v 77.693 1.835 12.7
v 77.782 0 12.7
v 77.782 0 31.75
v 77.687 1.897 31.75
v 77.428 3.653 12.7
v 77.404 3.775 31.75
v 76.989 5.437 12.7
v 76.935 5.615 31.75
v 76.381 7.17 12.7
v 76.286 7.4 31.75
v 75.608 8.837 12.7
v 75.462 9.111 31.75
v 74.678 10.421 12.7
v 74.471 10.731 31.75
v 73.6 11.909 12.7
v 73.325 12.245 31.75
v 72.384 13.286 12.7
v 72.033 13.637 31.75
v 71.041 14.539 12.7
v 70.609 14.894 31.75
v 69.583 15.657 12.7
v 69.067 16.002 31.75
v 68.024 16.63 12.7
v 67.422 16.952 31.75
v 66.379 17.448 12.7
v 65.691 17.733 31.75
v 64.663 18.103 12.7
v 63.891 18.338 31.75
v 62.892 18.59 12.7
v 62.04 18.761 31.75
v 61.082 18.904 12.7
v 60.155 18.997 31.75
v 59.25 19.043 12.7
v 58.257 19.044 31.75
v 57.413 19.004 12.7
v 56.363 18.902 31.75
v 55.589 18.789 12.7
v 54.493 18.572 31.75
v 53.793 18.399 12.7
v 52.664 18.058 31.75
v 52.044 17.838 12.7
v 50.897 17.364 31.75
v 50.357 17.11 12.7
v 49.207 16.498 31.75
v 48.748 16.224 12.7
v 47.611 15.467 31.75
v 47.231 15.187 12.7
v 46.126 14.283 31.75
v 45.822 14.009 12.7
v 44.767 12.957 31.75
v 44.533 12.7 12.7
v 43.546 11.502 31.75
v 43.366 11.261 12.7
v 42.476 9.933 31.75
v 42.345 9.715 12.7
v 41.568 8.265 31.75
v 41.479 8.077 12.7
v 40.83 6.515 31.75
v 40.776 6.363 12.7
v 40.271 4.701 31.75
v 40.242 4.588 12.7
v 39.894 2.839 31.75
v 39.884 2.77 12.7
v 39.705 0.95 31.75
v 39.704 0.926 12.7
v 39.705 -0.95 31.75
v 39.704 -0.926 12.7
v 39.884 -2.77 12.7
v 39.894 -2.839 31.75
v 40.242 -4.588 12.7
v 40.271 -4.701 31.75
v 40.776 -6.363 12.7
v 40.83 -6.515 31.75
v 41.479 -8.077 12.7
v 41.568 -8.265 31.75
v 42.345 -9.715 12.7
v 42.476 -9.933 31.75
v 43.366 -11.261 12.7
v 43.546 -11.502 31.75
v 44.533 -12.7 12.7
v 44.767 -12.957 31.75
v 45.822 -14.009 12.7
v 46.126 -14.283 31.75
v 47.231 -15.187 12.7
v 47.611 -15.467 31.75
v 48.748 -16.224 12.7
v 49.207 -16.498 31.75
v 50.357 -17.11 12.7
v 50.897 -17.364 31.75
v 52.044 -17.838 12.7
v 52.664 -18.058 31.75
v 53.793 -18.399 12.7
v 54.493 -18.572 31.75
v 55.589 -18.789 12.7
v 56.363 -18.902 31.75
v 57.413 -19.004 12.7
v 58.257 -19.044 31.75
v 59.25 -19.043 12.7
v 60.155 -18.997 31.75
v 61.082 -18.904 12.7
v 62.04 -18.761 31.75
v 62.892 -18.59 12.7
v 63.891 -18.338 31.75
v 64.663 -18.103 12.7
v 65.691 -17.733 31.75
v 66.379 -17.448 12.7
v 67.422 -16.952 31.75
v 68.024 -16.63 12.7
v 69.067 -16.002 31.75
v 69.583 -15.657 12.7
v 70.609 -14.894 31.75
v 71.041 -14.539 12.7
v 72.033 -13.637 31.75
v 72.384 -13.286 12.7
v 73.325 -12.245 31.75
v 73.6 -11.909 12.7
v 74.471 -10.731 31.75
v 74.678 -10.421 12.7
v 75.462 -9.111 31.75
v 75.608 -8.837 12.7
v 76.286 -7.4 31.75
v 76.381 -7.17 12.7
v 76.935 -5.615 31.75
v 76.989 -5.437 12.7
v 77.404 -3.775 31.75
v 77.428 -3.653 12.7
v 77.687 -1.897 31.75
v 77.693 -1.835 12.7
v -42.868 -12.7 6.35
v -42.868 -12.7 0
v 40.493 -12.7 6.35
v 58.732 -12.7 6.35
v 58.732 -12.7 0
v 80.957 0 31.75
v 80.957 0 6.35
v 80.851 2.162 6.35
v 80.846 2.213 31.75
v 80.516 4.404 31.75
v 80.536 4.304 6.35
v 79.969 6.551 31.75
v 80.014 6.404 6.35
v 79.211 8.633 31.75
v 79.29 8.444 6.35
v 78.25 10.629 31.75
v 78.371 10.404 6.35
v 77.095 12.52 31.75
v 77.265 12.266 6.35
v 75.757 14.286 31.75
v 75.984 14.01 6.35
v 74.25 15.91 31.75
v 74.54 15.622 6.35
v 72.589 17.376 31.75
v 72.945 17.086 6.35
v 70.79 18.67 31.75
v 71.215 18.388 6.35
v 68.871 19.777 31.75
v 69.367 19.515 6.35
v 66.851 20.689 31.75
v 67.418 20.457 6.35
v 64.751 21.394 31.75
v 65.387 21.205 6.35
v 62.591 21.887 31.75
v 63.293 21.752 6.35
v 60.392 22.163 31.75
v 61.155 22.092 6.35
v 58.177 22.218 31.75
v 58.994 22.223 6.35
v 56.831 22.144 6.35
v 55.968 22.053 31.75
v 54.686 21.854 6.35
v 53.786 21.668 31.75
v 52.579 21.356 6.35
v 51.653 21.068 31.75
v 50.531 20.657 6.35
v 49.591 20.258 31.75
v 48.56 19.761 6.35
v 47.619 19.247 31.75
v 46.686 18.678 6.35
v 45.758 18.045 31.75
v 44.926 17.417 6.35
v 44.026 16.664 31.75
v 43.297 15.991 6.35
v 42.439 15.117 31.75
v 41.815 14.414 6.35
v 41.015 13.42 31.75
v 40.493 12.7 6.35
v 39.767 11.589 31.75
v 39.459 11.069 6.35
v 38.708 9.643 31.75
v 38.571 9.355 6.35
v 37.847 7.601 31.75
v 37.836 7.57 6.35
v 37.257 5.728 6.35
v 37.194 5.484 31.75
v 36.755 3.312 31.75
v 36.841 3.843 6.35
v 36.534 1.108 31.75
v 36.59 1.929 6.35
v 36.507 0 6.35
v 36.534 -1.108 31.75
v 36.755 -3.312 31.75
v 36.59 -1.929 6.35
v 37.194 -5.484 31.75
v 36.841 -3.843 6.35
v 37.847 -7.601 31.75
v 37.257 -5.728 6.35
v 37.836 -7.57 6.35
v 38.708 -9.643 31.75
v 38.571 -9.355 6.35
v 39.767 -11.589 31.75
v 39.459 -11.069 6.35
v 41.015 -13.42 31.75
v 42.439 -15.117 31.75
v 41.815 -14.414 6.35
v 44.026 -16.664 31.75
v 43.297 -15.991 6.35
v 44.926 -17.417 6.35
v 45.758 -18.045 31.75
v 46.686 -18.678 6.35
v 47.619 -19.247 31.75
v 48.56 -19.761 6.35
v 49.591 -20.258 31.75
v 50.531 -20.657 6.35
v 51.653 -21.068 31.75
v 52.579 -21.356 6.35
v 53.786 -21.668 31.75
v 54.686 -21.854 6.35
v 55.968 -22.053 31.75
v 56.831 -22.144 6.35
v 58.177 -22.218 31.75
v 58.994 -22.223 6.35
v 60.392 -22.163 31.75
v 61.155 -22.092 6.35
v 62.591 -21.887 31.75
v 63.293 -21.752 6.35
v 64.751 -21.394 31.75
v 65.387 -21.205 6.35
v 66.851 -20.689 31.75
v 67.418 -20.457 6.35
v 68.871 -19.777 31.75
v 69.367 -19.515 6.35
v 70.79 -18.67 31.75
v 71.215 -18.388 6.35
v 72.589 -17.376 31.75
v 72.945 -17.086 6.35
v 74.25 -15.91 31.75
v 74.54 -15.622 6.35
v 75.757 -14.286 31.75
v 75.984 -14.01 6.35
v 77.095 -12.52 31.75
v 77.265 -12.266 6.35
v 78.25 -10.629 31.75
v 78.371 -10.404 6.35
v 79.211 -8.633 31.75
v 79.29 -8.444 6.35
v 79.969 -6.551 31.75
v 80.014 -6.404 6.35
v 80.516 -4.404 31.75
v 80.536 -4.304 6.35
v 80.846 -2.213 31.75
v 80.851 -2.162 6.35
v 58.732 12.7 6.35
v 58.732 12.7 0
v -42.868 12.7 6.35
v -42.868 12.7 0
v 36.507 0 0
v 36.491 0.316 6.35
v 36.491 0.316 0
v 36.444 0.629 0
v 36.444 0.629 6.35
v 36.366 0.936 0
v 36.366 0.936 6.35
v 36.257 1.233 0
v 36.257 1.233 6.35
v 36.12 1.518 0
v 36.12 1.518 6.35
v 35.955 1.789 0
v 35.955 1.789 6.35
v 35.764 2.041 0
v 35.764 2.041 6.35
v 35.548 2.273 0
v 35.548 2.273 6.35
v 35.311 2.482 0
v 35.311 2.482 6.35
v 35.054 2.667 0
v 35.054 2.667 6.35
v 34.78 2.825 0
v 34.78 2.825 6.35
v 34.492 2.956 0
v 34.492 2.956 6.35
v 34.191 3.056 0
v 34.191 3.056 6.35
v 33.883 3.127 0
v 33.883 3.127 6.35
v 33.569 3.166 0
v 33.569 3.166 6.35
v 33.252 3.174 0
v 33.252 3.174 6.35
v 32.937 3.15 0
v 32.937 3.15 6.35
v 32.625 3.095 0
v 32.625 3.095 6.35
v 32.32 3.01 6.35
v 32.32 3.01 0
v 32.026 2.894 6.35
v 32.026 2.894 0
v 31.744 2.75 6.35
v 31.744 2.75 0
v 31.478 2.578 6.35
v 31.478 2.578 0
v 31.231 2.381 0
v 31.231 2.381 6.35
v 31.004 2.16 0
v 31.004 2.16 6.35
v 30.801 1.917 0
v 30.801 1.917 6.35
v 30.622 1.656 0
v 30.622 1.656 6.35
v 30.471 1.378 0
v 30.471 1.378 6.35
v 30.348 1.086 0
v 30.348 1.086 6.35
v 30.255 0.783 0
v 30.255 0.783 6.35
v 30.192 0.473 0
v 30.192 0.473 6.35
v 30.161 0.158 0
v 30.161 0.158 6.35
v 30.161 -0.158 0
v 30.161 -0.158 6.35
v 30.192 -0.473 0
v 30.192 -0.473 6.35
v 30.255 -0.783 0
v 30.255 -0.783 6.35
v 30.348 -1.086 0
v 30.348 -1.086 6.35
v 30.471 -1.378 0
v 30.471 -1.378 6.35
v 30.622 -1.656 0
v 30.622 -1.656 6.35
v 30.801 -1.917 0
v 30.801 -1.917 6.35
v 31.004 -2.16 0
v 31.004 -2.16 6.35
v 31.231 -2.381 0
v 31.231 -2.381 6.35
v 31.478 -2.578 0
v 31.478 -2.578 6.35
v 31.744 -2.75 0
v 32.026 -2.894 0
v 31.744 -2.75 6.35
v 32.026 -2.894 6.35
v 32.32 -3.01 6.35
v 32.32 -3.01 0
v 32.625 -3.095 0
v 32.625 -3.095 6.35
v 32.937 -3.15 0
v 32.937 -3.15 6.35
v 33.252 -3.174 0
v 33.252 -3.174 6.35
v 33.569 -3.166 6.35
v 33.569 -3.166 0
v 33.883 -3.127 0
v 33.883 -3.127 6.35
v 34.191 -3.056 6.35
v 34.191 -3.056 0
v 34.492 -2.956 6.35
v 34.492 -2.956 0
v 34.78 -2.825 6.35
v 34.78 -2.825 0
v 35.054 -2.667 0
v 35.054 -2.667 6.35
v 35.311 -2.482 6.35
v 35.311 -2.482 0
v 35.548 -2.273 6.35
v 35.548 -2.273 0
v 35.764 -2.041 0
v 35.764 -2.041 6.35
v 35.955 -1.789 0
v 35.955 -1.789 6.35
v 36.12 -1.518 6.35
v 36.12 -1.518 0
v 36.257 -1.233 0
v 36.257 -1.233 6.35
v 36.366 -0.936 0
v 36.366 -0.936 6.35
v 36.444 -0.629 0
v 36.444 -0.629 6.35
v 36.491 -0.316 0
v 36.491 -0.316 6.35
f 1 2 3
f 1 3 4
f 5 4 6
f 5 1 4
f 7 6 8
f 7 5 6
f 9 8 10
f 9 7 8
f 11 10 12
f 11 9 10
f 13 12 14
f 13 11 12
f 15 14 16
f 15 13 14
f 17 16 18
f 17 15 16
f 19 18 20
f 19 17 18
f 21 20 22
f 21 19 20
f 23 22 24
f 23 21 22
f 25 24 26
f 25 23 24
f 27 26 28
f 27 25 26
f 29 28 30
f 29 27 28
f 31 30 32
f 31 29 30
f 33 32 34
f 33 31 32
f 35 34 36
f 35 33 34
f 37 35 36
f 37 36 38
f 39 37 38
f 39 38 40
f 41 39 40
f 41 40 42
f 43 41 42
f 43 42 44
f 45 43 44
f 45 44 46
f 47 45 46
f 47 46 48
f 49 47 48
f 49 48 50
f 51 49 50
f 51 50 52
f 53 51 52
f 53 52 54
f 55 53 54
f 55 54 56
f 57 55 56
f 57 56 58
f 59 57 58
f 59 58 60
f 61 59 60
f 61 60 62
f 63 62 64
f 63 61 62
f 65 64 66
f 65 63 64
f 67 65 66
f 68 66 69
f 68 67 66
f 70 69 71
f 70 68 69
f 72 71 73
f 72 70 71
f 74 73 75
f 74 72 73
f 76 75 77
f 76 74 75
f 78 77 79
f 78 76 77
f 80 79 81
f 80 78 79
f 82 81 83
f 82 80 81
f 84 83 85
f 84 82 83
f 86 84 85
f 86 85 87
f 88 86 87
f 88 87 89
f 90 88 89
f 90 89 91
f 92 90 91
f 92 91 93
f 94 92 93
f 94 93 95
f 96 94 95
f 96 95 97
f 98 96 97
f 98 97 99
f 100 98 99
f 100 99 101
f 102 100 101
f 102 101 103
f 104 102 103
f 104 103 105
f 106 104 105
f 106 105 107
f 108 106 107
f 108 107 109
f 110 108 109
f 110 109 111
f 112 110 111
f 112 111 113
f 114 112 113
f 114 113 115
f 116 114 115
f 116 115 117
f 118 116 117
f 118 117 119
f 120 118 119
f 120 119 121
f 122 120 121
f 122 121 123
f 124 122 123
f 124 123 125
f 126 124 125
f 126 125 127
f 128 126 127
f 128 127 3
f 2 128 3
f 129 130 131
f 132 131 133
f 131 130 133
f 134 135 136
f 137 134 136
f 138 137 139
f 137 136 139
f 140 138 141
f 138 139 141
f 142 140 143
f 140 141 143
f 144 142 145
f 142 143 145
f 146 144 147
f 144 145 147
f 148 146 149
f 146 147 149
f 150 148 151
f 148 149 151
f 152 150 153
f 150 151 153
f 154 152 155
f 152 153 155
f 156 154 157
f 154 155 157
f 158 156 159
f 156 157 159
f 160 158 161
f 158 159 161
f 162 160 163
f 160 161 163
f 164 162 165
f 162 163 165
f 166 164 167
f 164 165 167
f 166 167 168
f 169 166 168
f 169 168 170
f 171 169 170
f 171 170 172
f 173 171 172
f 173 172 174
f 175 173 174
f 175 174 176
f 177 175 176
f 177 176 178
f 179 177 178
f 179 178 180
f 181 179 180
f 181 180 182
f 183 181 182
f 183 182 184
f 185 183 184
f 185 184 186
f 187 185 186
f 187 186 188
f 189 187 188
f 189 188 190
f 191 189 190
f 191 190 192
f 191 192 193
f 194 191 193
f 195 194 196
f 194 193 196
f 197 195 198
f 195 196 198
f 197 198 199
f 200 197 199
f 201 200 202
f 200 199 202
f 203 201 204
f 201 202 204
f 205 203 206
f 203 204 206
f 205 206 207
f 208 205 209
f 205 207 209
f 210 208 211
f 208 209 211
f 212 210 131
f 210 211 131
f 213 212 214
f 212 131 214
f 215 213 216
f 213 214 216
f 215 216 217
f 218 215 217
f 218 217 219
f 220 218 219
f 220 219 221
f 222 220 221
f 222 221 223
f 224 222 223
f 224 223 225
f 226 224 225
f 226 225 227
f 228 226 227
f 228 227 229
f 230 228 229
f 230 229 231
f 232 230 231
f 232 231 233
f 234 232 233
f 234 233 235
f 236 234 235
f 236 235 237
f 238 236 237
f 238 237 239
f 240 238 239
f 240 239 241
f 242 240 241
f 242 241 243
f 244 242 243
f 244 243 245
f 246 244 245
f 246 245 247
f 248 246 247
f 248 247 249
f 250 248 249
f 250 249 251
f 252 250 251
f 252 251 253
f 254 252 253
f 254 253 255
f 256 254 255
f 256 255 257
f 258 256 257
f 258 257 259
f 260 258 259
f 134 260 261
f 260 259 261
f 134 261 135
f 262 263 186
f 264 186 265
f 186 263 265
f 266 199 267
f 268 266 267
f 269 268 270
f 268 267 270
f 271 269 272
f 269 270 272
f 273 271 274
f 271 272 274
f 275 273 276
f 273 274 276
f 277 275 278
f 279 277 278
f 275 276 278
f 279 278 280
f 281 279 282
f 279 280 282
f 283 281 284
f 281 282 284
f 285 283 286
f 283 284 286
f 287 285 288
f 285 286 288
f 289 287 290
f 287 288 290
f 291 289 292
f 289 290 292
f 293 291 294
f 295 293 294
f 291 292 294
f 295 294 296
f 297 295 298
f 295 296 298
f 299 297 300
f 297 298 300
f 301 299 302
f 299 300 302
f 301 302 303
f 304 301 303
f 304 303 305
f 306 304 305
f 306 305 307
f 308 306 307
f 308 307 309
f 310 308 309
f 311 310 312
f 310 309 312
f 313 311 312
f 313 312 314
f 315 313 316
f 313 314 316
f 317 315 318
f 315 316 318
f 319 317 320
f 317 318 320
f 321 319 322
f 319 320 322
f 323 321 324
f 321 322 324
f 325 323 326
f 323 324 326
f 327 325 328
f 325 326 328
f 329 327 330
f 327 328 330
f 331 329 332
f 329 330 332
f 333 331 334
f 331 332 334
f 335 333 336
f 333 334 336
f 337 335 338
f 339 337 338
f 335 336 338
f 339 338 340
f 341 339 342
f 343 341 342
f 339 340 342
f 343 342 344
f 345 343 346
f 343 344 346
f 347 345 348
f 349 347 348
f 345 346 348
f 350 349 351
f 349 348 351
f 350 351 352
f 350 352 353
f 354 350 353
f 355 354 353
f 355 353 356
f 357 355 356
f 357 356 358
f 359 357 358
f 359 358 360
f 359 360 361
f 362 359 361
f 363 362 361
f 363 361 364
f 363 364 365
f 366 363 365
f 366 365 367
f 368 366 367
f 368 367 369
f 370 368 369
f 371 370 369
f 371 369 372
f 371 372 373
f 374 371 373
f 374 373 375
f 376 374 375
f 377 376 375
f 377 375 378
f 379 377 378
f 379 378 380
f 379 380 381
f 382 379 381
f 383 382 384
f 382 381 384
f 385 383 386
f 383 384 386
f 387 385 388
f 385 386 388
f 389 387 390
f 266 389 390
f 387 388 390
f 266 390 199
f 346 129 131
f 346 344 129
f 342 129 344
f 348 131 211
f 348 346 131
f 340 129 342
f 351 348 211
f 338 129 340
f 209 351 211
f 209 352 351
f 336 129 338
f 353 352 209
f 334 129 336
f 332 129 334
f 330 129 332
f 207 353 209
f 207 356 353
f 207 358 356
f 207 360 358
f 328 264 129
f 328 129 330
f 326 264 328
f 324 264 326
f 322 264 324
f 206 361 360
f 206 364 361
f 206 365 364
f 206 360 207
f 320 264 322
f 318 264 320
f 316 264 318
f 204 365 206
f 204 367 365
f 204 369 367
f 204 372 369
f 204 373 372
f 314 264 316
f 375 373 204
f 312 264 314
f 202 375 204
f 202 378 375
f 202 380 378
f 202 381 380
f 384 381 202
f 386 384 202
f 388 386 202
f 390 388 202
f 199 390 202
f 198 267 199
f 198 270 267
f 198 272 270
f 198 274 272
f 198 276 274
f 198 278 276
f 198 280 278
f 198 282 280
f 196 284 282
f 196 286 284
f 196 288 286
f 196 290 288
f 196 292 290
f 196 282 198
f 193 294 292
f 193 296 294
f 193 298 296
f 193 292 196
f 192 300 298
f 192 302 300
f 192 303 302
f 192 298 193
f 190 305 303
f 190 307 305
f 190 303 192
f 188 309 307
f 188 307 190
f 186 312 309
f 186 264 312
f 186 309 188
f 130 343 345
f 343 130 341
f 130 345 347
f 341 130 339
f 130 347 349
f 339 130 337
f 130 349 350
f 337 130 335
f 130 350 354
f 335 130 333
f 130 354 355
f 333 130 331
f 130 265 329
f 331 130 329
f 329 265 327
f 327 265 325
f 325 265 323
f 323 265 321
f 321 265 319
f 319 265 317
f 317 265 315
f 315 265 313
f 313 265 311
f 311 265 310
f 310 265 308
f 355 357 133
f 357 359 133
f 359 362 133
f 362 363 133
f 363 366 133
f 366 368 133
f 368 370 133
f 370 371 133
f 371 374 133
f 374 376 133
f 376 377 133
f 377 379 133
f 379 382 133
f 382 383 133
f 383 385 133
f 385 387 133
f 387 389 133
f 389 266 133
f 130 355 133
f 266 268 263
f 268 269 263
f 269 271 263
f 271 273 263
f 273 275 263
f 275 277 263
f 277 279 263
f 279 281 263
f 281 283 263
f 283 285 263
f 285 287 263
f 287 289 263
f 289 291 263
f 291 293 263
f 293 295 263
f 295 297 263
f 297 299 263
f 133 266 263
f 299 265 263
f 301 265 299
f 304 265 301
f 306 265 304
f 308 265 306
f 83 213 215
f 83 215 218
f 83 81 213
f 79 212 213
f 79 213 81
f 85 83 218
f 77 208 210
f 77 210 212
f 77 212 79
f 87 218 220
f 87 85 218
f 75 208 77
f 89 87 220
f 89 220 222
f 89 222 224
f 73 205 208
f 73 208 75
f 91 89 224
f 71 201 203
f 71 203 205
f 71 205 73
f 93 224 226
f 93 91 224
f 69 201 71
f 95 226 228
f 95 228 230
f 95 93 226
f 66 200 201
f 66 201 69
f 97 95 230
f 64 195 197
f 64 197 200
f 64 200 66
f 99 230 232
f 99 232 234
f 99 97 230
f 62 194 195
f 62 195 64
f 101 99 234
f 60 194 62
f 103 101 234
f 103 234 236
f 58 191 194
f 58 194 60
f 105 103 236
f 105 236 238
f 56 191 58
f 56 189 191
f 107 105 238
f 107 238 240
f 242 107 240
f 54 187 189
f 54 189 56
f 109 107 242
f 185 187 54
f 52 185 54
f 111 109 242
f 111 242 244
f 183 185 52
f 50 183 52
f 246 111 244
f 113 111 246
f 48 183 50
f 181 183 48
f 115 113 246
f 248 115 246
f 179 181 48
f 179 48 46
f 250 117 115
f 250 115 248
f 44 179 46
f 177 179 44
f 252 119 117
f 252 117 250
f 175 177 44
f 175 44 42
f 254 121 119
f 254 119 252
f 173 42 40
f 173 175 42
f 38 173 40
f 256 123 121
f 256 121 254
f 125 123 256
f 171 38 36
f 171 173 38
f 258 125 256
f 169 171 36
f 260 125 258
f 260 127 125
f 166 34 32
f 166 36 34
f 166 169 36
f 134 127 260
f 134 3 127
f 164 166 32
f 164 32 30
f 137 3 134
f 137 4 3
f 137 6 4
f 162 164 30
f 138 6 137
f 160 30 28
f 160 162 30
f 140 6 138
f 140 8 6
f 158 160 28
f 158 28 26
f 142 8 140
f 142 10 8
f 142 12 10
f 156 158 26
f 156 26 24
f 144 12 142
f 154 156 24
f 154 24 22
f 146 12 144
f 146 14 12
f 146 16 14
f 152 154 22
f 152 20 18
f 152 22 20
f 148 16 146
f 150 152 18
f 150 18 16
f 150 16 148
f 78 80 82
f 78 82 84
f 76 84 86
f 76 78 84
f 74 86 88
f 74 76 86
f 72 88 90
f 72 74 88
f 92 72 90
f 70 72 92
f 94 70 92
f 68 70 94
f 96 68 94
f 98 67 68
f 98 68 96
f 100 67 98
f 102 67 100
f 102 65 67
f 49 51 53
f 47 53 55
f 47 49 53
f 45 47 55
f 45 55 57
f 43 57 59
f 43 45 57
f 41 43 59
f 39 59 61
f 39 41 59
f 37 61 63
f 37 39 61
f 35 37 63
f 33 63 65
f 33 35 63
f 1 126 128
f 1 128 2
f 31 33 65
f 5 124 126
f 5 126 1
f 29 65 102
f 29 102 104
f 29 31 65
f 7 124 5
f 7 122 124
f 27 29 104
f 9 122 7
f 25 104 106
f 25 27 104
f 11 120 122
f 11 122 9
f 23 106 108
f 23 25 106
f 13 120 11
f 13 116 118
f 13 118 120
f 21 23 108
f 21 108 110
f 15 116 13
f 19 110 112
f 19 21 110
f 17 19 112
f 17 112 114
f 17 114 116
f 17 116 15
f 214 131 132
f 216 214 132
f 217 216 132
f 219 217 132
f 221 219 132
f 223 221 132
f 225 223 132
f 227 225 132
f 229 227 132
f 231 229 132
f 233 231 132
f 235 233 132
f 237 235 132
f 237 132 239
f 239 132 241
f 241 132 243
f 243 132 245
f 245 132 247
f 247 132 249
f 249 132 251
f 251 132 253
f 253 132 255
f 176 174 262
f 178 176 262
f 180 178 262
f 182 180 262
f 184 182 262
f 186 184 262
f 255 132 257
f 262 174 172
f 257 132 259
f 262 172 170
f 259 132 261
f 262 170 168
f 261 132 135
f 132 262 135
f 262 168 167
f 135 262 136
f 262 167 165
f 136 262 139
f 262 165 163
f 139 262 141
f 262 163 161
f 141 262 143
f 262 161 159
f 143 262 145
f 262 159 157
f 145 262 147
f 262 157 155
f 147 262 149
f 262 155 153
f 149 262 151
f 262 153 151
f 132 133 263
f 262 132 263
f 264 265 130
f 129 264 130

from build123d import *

# Parameters (mm, degrees)
F1_DEPTH = 6.35
F2_R     = 3.175
F3_DEPTH = 6.35
F5_DEPTH = 6.35
F4_R     = 22.225
F4_R_2   = 19.05
F6_DEPTH = 25.4


with BuildPart() as f1:
    # F0 (on Top) → F1 (new body)
    with BuildSketch(Plane.XY):
        Polygon((-42.868439, 12.7), (-42.868439, 0), (-42.868439, -12.7), (58.731561, -12.7), (58.731561, 12.7), align=None)
    extrude(amount=F1_DEPTH)

    # F2 (on face) → F3 (cut)
    with BuildSketch(Plane.XY.offset(6.35)):
        with Locations((33.331561, 0)):
            Circle(F2_R)
    extrude(amount=-F3_DEPTH, mode=Mode.SUBTRACT)

    # F4 (on face) → F5 (join)
    with BuildSketch(Plane.XY.offset(6.35)):
        with BuildLine():
            ThreePointArc((77.781561, 0), (65.529022, 17.795983), (44.532529, 12.7))
            Line((44.532529, 12.7), (58.731561, 12.7))
            Line((58.731561, 12.7), (58.731561, -12.7))
            Line((58.731561, -12.7), (44.532529, -12.7))
            ThreePointArc((44.532529, -12.7), (65.529022, -17.795983), (77.781561, 0))
        make_face()
        with BuildLine():
            Line((58.731561, 12.7), (44.532529, 12.7))
            ThreePointArc((44.532529, 12.7), (39.681561, 0), (44.532529, -12.7))
            Line((44.532529, -12.7), (58.731561, -12.7))
            Line((58.731561, -12.7), (58.731561, 12.7))
        make_face()
    extrude(amount=F5_DEPTH)

    # F4 (on face) → F6 (join)
    with BuildSketch(Plane.XY.offset(6.35)):
        with Locations((58.731561, 0)):
            Circle(F4_R)
        with Locations((58.731561, 0)):
            Circle(F4_R_2, mode=Mode.SUBTRACT)
    extrude(amount=F6_DEPTH)


solid = f1.part
